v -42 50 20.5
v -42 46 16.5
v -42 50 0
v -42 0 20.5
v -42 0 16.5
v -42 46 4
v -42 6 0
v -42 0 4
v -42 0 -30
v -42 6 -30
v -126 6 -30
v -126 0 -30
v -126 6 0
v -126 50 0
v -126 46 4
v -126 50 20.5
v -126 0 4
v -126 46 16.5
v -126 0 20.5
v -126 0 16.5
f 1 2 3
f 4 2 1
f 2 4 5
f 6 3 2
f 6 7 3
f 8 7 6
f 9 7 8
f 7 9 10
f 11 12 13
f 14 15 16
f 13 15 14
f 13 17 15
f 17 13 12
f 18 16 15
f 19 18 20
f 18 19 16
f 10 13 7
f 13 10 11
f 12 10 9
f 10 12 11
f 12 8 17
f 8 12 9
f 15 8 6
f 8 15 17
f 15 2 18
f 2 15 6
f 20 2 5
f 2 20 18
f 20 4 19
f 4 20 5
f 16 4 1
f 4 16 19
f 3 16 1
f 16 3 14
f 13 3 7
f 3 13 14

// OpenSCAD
// --- Dimensions ---
// Overall extrusion length along X axis
length_x = 84; 

// Wall thickness of the bucket (reference)
wall_thickness = 12; 

// Vertical height of the legs
leg_height = 50; 

// Thickness of the top bridge
bridge_thickness = 4; 

// Width of the legs (Y-axis dimension)
leg_width = 4; 

// Gap between legs (16.5 - 4 = 12.5mm)
gap_width = 12.5; 

// Ledge thickness (Z-axis dimension)
ledge_thickness = 6; 

// Ledge depth (Y-axis dimension)
ledge_depth = 30; 

// PCR tube hole diameter
hole_diameter = 6.4; 

// PCR tube hole spacing (X-axis)
hole_spacing_x = 9; 

// Number of tubes
num_tubes = 8; 

// Number of tubes Y-position (offset from origin)
hole_y_pos = -15; 

// Smoothness for cylinders
fn_val = 64;

// --- Implementation ---

// The previous error was caused by a mismatch between the 2D profile 
// coordinates and the 3D extrusion logic. 
// The user wants the profile in the YZ plane, extruded along X.
// This means the 2D polygon coordinates should be [Y, Z].
// The extrusion height is the X dimension.

module profile_2d() {
    // We define the profile in the YZ plane.
    // The X dimension is handled by linear_extrude.
    union() {
        // Inner Leg: y=0 to 4, z=0 to 50
        polygon(points=[[0,0], [4,0], [4,50], [0,50]]);
        
        // Outer Leg: y=16.5 to 20.5, z=0 to 50
        polygon(points=[[16.5,0], [20.5,0], [20.5,50], [16.5,50]]);
        
        // Top Bridge: z=46 to 50, y=0 to 20.5
        polygon(points=[[0,46], [20.5,46], [20.5,50], [0,50]]);
        
        // Ledge: z=0 to 6, y=-30 to 0
        polygon(points=[[-30,0], [0,0], [0,6], [-30,6]]);
    }
}

// Final Assembly
difference() {
    // 1. Create the main body by extruding the 2D profile along X.
    // The user specified the part is centered on X=0.
    // Since linear_extrude builds from Z=0 upwards, we must rotate 
    // the 2D profile so that the extrusion direction is the X axis.
    // However, it is simpler to define the profile in XY and extrude in Z,
    // but the user explicitly asked for the profile in the YZ plane extruded along X.
    // To achieve "centered on X=0" with linear_extrude (which starts at 0),
    // we translate the result by -length_x/2.
    
    translate([-length_x/2, 0, 0])
        rotate([0, -90, 0]) // Rotate profile so extrusion is along X
            linear_extrude(height = length_x)
                profile_2d();

    // 2. Subtract the tube holes
    // Holes are 6.4mm diameter, vertical (Z-axis).
    // They are centered on X, at y = -15.
    for (i = [0 : num_tubes - 1]) {
        // Calculate X offset to center the 8 holes
        // Total span = (7 * 9) = 63. 
        // Center of span is at (63/2) = 31.5.
        // We want the group centered on X=0.
        x_offset = (i * hole_spacing_x) - ((num_tubes - 1) * hole_spacing_x / 2);
        
        // The holes are vertical (Z-axis).
        // We translate the cylinder to the hole position.
        // The hole is in the ledge (y = -15, z = 0 to 6).
        translate([x_offset, hole_y_pos, -1]) 
            cylinder(h = ledge_thickness + 2, d = hole_diameter, $fn = fn_val);
    }
}
